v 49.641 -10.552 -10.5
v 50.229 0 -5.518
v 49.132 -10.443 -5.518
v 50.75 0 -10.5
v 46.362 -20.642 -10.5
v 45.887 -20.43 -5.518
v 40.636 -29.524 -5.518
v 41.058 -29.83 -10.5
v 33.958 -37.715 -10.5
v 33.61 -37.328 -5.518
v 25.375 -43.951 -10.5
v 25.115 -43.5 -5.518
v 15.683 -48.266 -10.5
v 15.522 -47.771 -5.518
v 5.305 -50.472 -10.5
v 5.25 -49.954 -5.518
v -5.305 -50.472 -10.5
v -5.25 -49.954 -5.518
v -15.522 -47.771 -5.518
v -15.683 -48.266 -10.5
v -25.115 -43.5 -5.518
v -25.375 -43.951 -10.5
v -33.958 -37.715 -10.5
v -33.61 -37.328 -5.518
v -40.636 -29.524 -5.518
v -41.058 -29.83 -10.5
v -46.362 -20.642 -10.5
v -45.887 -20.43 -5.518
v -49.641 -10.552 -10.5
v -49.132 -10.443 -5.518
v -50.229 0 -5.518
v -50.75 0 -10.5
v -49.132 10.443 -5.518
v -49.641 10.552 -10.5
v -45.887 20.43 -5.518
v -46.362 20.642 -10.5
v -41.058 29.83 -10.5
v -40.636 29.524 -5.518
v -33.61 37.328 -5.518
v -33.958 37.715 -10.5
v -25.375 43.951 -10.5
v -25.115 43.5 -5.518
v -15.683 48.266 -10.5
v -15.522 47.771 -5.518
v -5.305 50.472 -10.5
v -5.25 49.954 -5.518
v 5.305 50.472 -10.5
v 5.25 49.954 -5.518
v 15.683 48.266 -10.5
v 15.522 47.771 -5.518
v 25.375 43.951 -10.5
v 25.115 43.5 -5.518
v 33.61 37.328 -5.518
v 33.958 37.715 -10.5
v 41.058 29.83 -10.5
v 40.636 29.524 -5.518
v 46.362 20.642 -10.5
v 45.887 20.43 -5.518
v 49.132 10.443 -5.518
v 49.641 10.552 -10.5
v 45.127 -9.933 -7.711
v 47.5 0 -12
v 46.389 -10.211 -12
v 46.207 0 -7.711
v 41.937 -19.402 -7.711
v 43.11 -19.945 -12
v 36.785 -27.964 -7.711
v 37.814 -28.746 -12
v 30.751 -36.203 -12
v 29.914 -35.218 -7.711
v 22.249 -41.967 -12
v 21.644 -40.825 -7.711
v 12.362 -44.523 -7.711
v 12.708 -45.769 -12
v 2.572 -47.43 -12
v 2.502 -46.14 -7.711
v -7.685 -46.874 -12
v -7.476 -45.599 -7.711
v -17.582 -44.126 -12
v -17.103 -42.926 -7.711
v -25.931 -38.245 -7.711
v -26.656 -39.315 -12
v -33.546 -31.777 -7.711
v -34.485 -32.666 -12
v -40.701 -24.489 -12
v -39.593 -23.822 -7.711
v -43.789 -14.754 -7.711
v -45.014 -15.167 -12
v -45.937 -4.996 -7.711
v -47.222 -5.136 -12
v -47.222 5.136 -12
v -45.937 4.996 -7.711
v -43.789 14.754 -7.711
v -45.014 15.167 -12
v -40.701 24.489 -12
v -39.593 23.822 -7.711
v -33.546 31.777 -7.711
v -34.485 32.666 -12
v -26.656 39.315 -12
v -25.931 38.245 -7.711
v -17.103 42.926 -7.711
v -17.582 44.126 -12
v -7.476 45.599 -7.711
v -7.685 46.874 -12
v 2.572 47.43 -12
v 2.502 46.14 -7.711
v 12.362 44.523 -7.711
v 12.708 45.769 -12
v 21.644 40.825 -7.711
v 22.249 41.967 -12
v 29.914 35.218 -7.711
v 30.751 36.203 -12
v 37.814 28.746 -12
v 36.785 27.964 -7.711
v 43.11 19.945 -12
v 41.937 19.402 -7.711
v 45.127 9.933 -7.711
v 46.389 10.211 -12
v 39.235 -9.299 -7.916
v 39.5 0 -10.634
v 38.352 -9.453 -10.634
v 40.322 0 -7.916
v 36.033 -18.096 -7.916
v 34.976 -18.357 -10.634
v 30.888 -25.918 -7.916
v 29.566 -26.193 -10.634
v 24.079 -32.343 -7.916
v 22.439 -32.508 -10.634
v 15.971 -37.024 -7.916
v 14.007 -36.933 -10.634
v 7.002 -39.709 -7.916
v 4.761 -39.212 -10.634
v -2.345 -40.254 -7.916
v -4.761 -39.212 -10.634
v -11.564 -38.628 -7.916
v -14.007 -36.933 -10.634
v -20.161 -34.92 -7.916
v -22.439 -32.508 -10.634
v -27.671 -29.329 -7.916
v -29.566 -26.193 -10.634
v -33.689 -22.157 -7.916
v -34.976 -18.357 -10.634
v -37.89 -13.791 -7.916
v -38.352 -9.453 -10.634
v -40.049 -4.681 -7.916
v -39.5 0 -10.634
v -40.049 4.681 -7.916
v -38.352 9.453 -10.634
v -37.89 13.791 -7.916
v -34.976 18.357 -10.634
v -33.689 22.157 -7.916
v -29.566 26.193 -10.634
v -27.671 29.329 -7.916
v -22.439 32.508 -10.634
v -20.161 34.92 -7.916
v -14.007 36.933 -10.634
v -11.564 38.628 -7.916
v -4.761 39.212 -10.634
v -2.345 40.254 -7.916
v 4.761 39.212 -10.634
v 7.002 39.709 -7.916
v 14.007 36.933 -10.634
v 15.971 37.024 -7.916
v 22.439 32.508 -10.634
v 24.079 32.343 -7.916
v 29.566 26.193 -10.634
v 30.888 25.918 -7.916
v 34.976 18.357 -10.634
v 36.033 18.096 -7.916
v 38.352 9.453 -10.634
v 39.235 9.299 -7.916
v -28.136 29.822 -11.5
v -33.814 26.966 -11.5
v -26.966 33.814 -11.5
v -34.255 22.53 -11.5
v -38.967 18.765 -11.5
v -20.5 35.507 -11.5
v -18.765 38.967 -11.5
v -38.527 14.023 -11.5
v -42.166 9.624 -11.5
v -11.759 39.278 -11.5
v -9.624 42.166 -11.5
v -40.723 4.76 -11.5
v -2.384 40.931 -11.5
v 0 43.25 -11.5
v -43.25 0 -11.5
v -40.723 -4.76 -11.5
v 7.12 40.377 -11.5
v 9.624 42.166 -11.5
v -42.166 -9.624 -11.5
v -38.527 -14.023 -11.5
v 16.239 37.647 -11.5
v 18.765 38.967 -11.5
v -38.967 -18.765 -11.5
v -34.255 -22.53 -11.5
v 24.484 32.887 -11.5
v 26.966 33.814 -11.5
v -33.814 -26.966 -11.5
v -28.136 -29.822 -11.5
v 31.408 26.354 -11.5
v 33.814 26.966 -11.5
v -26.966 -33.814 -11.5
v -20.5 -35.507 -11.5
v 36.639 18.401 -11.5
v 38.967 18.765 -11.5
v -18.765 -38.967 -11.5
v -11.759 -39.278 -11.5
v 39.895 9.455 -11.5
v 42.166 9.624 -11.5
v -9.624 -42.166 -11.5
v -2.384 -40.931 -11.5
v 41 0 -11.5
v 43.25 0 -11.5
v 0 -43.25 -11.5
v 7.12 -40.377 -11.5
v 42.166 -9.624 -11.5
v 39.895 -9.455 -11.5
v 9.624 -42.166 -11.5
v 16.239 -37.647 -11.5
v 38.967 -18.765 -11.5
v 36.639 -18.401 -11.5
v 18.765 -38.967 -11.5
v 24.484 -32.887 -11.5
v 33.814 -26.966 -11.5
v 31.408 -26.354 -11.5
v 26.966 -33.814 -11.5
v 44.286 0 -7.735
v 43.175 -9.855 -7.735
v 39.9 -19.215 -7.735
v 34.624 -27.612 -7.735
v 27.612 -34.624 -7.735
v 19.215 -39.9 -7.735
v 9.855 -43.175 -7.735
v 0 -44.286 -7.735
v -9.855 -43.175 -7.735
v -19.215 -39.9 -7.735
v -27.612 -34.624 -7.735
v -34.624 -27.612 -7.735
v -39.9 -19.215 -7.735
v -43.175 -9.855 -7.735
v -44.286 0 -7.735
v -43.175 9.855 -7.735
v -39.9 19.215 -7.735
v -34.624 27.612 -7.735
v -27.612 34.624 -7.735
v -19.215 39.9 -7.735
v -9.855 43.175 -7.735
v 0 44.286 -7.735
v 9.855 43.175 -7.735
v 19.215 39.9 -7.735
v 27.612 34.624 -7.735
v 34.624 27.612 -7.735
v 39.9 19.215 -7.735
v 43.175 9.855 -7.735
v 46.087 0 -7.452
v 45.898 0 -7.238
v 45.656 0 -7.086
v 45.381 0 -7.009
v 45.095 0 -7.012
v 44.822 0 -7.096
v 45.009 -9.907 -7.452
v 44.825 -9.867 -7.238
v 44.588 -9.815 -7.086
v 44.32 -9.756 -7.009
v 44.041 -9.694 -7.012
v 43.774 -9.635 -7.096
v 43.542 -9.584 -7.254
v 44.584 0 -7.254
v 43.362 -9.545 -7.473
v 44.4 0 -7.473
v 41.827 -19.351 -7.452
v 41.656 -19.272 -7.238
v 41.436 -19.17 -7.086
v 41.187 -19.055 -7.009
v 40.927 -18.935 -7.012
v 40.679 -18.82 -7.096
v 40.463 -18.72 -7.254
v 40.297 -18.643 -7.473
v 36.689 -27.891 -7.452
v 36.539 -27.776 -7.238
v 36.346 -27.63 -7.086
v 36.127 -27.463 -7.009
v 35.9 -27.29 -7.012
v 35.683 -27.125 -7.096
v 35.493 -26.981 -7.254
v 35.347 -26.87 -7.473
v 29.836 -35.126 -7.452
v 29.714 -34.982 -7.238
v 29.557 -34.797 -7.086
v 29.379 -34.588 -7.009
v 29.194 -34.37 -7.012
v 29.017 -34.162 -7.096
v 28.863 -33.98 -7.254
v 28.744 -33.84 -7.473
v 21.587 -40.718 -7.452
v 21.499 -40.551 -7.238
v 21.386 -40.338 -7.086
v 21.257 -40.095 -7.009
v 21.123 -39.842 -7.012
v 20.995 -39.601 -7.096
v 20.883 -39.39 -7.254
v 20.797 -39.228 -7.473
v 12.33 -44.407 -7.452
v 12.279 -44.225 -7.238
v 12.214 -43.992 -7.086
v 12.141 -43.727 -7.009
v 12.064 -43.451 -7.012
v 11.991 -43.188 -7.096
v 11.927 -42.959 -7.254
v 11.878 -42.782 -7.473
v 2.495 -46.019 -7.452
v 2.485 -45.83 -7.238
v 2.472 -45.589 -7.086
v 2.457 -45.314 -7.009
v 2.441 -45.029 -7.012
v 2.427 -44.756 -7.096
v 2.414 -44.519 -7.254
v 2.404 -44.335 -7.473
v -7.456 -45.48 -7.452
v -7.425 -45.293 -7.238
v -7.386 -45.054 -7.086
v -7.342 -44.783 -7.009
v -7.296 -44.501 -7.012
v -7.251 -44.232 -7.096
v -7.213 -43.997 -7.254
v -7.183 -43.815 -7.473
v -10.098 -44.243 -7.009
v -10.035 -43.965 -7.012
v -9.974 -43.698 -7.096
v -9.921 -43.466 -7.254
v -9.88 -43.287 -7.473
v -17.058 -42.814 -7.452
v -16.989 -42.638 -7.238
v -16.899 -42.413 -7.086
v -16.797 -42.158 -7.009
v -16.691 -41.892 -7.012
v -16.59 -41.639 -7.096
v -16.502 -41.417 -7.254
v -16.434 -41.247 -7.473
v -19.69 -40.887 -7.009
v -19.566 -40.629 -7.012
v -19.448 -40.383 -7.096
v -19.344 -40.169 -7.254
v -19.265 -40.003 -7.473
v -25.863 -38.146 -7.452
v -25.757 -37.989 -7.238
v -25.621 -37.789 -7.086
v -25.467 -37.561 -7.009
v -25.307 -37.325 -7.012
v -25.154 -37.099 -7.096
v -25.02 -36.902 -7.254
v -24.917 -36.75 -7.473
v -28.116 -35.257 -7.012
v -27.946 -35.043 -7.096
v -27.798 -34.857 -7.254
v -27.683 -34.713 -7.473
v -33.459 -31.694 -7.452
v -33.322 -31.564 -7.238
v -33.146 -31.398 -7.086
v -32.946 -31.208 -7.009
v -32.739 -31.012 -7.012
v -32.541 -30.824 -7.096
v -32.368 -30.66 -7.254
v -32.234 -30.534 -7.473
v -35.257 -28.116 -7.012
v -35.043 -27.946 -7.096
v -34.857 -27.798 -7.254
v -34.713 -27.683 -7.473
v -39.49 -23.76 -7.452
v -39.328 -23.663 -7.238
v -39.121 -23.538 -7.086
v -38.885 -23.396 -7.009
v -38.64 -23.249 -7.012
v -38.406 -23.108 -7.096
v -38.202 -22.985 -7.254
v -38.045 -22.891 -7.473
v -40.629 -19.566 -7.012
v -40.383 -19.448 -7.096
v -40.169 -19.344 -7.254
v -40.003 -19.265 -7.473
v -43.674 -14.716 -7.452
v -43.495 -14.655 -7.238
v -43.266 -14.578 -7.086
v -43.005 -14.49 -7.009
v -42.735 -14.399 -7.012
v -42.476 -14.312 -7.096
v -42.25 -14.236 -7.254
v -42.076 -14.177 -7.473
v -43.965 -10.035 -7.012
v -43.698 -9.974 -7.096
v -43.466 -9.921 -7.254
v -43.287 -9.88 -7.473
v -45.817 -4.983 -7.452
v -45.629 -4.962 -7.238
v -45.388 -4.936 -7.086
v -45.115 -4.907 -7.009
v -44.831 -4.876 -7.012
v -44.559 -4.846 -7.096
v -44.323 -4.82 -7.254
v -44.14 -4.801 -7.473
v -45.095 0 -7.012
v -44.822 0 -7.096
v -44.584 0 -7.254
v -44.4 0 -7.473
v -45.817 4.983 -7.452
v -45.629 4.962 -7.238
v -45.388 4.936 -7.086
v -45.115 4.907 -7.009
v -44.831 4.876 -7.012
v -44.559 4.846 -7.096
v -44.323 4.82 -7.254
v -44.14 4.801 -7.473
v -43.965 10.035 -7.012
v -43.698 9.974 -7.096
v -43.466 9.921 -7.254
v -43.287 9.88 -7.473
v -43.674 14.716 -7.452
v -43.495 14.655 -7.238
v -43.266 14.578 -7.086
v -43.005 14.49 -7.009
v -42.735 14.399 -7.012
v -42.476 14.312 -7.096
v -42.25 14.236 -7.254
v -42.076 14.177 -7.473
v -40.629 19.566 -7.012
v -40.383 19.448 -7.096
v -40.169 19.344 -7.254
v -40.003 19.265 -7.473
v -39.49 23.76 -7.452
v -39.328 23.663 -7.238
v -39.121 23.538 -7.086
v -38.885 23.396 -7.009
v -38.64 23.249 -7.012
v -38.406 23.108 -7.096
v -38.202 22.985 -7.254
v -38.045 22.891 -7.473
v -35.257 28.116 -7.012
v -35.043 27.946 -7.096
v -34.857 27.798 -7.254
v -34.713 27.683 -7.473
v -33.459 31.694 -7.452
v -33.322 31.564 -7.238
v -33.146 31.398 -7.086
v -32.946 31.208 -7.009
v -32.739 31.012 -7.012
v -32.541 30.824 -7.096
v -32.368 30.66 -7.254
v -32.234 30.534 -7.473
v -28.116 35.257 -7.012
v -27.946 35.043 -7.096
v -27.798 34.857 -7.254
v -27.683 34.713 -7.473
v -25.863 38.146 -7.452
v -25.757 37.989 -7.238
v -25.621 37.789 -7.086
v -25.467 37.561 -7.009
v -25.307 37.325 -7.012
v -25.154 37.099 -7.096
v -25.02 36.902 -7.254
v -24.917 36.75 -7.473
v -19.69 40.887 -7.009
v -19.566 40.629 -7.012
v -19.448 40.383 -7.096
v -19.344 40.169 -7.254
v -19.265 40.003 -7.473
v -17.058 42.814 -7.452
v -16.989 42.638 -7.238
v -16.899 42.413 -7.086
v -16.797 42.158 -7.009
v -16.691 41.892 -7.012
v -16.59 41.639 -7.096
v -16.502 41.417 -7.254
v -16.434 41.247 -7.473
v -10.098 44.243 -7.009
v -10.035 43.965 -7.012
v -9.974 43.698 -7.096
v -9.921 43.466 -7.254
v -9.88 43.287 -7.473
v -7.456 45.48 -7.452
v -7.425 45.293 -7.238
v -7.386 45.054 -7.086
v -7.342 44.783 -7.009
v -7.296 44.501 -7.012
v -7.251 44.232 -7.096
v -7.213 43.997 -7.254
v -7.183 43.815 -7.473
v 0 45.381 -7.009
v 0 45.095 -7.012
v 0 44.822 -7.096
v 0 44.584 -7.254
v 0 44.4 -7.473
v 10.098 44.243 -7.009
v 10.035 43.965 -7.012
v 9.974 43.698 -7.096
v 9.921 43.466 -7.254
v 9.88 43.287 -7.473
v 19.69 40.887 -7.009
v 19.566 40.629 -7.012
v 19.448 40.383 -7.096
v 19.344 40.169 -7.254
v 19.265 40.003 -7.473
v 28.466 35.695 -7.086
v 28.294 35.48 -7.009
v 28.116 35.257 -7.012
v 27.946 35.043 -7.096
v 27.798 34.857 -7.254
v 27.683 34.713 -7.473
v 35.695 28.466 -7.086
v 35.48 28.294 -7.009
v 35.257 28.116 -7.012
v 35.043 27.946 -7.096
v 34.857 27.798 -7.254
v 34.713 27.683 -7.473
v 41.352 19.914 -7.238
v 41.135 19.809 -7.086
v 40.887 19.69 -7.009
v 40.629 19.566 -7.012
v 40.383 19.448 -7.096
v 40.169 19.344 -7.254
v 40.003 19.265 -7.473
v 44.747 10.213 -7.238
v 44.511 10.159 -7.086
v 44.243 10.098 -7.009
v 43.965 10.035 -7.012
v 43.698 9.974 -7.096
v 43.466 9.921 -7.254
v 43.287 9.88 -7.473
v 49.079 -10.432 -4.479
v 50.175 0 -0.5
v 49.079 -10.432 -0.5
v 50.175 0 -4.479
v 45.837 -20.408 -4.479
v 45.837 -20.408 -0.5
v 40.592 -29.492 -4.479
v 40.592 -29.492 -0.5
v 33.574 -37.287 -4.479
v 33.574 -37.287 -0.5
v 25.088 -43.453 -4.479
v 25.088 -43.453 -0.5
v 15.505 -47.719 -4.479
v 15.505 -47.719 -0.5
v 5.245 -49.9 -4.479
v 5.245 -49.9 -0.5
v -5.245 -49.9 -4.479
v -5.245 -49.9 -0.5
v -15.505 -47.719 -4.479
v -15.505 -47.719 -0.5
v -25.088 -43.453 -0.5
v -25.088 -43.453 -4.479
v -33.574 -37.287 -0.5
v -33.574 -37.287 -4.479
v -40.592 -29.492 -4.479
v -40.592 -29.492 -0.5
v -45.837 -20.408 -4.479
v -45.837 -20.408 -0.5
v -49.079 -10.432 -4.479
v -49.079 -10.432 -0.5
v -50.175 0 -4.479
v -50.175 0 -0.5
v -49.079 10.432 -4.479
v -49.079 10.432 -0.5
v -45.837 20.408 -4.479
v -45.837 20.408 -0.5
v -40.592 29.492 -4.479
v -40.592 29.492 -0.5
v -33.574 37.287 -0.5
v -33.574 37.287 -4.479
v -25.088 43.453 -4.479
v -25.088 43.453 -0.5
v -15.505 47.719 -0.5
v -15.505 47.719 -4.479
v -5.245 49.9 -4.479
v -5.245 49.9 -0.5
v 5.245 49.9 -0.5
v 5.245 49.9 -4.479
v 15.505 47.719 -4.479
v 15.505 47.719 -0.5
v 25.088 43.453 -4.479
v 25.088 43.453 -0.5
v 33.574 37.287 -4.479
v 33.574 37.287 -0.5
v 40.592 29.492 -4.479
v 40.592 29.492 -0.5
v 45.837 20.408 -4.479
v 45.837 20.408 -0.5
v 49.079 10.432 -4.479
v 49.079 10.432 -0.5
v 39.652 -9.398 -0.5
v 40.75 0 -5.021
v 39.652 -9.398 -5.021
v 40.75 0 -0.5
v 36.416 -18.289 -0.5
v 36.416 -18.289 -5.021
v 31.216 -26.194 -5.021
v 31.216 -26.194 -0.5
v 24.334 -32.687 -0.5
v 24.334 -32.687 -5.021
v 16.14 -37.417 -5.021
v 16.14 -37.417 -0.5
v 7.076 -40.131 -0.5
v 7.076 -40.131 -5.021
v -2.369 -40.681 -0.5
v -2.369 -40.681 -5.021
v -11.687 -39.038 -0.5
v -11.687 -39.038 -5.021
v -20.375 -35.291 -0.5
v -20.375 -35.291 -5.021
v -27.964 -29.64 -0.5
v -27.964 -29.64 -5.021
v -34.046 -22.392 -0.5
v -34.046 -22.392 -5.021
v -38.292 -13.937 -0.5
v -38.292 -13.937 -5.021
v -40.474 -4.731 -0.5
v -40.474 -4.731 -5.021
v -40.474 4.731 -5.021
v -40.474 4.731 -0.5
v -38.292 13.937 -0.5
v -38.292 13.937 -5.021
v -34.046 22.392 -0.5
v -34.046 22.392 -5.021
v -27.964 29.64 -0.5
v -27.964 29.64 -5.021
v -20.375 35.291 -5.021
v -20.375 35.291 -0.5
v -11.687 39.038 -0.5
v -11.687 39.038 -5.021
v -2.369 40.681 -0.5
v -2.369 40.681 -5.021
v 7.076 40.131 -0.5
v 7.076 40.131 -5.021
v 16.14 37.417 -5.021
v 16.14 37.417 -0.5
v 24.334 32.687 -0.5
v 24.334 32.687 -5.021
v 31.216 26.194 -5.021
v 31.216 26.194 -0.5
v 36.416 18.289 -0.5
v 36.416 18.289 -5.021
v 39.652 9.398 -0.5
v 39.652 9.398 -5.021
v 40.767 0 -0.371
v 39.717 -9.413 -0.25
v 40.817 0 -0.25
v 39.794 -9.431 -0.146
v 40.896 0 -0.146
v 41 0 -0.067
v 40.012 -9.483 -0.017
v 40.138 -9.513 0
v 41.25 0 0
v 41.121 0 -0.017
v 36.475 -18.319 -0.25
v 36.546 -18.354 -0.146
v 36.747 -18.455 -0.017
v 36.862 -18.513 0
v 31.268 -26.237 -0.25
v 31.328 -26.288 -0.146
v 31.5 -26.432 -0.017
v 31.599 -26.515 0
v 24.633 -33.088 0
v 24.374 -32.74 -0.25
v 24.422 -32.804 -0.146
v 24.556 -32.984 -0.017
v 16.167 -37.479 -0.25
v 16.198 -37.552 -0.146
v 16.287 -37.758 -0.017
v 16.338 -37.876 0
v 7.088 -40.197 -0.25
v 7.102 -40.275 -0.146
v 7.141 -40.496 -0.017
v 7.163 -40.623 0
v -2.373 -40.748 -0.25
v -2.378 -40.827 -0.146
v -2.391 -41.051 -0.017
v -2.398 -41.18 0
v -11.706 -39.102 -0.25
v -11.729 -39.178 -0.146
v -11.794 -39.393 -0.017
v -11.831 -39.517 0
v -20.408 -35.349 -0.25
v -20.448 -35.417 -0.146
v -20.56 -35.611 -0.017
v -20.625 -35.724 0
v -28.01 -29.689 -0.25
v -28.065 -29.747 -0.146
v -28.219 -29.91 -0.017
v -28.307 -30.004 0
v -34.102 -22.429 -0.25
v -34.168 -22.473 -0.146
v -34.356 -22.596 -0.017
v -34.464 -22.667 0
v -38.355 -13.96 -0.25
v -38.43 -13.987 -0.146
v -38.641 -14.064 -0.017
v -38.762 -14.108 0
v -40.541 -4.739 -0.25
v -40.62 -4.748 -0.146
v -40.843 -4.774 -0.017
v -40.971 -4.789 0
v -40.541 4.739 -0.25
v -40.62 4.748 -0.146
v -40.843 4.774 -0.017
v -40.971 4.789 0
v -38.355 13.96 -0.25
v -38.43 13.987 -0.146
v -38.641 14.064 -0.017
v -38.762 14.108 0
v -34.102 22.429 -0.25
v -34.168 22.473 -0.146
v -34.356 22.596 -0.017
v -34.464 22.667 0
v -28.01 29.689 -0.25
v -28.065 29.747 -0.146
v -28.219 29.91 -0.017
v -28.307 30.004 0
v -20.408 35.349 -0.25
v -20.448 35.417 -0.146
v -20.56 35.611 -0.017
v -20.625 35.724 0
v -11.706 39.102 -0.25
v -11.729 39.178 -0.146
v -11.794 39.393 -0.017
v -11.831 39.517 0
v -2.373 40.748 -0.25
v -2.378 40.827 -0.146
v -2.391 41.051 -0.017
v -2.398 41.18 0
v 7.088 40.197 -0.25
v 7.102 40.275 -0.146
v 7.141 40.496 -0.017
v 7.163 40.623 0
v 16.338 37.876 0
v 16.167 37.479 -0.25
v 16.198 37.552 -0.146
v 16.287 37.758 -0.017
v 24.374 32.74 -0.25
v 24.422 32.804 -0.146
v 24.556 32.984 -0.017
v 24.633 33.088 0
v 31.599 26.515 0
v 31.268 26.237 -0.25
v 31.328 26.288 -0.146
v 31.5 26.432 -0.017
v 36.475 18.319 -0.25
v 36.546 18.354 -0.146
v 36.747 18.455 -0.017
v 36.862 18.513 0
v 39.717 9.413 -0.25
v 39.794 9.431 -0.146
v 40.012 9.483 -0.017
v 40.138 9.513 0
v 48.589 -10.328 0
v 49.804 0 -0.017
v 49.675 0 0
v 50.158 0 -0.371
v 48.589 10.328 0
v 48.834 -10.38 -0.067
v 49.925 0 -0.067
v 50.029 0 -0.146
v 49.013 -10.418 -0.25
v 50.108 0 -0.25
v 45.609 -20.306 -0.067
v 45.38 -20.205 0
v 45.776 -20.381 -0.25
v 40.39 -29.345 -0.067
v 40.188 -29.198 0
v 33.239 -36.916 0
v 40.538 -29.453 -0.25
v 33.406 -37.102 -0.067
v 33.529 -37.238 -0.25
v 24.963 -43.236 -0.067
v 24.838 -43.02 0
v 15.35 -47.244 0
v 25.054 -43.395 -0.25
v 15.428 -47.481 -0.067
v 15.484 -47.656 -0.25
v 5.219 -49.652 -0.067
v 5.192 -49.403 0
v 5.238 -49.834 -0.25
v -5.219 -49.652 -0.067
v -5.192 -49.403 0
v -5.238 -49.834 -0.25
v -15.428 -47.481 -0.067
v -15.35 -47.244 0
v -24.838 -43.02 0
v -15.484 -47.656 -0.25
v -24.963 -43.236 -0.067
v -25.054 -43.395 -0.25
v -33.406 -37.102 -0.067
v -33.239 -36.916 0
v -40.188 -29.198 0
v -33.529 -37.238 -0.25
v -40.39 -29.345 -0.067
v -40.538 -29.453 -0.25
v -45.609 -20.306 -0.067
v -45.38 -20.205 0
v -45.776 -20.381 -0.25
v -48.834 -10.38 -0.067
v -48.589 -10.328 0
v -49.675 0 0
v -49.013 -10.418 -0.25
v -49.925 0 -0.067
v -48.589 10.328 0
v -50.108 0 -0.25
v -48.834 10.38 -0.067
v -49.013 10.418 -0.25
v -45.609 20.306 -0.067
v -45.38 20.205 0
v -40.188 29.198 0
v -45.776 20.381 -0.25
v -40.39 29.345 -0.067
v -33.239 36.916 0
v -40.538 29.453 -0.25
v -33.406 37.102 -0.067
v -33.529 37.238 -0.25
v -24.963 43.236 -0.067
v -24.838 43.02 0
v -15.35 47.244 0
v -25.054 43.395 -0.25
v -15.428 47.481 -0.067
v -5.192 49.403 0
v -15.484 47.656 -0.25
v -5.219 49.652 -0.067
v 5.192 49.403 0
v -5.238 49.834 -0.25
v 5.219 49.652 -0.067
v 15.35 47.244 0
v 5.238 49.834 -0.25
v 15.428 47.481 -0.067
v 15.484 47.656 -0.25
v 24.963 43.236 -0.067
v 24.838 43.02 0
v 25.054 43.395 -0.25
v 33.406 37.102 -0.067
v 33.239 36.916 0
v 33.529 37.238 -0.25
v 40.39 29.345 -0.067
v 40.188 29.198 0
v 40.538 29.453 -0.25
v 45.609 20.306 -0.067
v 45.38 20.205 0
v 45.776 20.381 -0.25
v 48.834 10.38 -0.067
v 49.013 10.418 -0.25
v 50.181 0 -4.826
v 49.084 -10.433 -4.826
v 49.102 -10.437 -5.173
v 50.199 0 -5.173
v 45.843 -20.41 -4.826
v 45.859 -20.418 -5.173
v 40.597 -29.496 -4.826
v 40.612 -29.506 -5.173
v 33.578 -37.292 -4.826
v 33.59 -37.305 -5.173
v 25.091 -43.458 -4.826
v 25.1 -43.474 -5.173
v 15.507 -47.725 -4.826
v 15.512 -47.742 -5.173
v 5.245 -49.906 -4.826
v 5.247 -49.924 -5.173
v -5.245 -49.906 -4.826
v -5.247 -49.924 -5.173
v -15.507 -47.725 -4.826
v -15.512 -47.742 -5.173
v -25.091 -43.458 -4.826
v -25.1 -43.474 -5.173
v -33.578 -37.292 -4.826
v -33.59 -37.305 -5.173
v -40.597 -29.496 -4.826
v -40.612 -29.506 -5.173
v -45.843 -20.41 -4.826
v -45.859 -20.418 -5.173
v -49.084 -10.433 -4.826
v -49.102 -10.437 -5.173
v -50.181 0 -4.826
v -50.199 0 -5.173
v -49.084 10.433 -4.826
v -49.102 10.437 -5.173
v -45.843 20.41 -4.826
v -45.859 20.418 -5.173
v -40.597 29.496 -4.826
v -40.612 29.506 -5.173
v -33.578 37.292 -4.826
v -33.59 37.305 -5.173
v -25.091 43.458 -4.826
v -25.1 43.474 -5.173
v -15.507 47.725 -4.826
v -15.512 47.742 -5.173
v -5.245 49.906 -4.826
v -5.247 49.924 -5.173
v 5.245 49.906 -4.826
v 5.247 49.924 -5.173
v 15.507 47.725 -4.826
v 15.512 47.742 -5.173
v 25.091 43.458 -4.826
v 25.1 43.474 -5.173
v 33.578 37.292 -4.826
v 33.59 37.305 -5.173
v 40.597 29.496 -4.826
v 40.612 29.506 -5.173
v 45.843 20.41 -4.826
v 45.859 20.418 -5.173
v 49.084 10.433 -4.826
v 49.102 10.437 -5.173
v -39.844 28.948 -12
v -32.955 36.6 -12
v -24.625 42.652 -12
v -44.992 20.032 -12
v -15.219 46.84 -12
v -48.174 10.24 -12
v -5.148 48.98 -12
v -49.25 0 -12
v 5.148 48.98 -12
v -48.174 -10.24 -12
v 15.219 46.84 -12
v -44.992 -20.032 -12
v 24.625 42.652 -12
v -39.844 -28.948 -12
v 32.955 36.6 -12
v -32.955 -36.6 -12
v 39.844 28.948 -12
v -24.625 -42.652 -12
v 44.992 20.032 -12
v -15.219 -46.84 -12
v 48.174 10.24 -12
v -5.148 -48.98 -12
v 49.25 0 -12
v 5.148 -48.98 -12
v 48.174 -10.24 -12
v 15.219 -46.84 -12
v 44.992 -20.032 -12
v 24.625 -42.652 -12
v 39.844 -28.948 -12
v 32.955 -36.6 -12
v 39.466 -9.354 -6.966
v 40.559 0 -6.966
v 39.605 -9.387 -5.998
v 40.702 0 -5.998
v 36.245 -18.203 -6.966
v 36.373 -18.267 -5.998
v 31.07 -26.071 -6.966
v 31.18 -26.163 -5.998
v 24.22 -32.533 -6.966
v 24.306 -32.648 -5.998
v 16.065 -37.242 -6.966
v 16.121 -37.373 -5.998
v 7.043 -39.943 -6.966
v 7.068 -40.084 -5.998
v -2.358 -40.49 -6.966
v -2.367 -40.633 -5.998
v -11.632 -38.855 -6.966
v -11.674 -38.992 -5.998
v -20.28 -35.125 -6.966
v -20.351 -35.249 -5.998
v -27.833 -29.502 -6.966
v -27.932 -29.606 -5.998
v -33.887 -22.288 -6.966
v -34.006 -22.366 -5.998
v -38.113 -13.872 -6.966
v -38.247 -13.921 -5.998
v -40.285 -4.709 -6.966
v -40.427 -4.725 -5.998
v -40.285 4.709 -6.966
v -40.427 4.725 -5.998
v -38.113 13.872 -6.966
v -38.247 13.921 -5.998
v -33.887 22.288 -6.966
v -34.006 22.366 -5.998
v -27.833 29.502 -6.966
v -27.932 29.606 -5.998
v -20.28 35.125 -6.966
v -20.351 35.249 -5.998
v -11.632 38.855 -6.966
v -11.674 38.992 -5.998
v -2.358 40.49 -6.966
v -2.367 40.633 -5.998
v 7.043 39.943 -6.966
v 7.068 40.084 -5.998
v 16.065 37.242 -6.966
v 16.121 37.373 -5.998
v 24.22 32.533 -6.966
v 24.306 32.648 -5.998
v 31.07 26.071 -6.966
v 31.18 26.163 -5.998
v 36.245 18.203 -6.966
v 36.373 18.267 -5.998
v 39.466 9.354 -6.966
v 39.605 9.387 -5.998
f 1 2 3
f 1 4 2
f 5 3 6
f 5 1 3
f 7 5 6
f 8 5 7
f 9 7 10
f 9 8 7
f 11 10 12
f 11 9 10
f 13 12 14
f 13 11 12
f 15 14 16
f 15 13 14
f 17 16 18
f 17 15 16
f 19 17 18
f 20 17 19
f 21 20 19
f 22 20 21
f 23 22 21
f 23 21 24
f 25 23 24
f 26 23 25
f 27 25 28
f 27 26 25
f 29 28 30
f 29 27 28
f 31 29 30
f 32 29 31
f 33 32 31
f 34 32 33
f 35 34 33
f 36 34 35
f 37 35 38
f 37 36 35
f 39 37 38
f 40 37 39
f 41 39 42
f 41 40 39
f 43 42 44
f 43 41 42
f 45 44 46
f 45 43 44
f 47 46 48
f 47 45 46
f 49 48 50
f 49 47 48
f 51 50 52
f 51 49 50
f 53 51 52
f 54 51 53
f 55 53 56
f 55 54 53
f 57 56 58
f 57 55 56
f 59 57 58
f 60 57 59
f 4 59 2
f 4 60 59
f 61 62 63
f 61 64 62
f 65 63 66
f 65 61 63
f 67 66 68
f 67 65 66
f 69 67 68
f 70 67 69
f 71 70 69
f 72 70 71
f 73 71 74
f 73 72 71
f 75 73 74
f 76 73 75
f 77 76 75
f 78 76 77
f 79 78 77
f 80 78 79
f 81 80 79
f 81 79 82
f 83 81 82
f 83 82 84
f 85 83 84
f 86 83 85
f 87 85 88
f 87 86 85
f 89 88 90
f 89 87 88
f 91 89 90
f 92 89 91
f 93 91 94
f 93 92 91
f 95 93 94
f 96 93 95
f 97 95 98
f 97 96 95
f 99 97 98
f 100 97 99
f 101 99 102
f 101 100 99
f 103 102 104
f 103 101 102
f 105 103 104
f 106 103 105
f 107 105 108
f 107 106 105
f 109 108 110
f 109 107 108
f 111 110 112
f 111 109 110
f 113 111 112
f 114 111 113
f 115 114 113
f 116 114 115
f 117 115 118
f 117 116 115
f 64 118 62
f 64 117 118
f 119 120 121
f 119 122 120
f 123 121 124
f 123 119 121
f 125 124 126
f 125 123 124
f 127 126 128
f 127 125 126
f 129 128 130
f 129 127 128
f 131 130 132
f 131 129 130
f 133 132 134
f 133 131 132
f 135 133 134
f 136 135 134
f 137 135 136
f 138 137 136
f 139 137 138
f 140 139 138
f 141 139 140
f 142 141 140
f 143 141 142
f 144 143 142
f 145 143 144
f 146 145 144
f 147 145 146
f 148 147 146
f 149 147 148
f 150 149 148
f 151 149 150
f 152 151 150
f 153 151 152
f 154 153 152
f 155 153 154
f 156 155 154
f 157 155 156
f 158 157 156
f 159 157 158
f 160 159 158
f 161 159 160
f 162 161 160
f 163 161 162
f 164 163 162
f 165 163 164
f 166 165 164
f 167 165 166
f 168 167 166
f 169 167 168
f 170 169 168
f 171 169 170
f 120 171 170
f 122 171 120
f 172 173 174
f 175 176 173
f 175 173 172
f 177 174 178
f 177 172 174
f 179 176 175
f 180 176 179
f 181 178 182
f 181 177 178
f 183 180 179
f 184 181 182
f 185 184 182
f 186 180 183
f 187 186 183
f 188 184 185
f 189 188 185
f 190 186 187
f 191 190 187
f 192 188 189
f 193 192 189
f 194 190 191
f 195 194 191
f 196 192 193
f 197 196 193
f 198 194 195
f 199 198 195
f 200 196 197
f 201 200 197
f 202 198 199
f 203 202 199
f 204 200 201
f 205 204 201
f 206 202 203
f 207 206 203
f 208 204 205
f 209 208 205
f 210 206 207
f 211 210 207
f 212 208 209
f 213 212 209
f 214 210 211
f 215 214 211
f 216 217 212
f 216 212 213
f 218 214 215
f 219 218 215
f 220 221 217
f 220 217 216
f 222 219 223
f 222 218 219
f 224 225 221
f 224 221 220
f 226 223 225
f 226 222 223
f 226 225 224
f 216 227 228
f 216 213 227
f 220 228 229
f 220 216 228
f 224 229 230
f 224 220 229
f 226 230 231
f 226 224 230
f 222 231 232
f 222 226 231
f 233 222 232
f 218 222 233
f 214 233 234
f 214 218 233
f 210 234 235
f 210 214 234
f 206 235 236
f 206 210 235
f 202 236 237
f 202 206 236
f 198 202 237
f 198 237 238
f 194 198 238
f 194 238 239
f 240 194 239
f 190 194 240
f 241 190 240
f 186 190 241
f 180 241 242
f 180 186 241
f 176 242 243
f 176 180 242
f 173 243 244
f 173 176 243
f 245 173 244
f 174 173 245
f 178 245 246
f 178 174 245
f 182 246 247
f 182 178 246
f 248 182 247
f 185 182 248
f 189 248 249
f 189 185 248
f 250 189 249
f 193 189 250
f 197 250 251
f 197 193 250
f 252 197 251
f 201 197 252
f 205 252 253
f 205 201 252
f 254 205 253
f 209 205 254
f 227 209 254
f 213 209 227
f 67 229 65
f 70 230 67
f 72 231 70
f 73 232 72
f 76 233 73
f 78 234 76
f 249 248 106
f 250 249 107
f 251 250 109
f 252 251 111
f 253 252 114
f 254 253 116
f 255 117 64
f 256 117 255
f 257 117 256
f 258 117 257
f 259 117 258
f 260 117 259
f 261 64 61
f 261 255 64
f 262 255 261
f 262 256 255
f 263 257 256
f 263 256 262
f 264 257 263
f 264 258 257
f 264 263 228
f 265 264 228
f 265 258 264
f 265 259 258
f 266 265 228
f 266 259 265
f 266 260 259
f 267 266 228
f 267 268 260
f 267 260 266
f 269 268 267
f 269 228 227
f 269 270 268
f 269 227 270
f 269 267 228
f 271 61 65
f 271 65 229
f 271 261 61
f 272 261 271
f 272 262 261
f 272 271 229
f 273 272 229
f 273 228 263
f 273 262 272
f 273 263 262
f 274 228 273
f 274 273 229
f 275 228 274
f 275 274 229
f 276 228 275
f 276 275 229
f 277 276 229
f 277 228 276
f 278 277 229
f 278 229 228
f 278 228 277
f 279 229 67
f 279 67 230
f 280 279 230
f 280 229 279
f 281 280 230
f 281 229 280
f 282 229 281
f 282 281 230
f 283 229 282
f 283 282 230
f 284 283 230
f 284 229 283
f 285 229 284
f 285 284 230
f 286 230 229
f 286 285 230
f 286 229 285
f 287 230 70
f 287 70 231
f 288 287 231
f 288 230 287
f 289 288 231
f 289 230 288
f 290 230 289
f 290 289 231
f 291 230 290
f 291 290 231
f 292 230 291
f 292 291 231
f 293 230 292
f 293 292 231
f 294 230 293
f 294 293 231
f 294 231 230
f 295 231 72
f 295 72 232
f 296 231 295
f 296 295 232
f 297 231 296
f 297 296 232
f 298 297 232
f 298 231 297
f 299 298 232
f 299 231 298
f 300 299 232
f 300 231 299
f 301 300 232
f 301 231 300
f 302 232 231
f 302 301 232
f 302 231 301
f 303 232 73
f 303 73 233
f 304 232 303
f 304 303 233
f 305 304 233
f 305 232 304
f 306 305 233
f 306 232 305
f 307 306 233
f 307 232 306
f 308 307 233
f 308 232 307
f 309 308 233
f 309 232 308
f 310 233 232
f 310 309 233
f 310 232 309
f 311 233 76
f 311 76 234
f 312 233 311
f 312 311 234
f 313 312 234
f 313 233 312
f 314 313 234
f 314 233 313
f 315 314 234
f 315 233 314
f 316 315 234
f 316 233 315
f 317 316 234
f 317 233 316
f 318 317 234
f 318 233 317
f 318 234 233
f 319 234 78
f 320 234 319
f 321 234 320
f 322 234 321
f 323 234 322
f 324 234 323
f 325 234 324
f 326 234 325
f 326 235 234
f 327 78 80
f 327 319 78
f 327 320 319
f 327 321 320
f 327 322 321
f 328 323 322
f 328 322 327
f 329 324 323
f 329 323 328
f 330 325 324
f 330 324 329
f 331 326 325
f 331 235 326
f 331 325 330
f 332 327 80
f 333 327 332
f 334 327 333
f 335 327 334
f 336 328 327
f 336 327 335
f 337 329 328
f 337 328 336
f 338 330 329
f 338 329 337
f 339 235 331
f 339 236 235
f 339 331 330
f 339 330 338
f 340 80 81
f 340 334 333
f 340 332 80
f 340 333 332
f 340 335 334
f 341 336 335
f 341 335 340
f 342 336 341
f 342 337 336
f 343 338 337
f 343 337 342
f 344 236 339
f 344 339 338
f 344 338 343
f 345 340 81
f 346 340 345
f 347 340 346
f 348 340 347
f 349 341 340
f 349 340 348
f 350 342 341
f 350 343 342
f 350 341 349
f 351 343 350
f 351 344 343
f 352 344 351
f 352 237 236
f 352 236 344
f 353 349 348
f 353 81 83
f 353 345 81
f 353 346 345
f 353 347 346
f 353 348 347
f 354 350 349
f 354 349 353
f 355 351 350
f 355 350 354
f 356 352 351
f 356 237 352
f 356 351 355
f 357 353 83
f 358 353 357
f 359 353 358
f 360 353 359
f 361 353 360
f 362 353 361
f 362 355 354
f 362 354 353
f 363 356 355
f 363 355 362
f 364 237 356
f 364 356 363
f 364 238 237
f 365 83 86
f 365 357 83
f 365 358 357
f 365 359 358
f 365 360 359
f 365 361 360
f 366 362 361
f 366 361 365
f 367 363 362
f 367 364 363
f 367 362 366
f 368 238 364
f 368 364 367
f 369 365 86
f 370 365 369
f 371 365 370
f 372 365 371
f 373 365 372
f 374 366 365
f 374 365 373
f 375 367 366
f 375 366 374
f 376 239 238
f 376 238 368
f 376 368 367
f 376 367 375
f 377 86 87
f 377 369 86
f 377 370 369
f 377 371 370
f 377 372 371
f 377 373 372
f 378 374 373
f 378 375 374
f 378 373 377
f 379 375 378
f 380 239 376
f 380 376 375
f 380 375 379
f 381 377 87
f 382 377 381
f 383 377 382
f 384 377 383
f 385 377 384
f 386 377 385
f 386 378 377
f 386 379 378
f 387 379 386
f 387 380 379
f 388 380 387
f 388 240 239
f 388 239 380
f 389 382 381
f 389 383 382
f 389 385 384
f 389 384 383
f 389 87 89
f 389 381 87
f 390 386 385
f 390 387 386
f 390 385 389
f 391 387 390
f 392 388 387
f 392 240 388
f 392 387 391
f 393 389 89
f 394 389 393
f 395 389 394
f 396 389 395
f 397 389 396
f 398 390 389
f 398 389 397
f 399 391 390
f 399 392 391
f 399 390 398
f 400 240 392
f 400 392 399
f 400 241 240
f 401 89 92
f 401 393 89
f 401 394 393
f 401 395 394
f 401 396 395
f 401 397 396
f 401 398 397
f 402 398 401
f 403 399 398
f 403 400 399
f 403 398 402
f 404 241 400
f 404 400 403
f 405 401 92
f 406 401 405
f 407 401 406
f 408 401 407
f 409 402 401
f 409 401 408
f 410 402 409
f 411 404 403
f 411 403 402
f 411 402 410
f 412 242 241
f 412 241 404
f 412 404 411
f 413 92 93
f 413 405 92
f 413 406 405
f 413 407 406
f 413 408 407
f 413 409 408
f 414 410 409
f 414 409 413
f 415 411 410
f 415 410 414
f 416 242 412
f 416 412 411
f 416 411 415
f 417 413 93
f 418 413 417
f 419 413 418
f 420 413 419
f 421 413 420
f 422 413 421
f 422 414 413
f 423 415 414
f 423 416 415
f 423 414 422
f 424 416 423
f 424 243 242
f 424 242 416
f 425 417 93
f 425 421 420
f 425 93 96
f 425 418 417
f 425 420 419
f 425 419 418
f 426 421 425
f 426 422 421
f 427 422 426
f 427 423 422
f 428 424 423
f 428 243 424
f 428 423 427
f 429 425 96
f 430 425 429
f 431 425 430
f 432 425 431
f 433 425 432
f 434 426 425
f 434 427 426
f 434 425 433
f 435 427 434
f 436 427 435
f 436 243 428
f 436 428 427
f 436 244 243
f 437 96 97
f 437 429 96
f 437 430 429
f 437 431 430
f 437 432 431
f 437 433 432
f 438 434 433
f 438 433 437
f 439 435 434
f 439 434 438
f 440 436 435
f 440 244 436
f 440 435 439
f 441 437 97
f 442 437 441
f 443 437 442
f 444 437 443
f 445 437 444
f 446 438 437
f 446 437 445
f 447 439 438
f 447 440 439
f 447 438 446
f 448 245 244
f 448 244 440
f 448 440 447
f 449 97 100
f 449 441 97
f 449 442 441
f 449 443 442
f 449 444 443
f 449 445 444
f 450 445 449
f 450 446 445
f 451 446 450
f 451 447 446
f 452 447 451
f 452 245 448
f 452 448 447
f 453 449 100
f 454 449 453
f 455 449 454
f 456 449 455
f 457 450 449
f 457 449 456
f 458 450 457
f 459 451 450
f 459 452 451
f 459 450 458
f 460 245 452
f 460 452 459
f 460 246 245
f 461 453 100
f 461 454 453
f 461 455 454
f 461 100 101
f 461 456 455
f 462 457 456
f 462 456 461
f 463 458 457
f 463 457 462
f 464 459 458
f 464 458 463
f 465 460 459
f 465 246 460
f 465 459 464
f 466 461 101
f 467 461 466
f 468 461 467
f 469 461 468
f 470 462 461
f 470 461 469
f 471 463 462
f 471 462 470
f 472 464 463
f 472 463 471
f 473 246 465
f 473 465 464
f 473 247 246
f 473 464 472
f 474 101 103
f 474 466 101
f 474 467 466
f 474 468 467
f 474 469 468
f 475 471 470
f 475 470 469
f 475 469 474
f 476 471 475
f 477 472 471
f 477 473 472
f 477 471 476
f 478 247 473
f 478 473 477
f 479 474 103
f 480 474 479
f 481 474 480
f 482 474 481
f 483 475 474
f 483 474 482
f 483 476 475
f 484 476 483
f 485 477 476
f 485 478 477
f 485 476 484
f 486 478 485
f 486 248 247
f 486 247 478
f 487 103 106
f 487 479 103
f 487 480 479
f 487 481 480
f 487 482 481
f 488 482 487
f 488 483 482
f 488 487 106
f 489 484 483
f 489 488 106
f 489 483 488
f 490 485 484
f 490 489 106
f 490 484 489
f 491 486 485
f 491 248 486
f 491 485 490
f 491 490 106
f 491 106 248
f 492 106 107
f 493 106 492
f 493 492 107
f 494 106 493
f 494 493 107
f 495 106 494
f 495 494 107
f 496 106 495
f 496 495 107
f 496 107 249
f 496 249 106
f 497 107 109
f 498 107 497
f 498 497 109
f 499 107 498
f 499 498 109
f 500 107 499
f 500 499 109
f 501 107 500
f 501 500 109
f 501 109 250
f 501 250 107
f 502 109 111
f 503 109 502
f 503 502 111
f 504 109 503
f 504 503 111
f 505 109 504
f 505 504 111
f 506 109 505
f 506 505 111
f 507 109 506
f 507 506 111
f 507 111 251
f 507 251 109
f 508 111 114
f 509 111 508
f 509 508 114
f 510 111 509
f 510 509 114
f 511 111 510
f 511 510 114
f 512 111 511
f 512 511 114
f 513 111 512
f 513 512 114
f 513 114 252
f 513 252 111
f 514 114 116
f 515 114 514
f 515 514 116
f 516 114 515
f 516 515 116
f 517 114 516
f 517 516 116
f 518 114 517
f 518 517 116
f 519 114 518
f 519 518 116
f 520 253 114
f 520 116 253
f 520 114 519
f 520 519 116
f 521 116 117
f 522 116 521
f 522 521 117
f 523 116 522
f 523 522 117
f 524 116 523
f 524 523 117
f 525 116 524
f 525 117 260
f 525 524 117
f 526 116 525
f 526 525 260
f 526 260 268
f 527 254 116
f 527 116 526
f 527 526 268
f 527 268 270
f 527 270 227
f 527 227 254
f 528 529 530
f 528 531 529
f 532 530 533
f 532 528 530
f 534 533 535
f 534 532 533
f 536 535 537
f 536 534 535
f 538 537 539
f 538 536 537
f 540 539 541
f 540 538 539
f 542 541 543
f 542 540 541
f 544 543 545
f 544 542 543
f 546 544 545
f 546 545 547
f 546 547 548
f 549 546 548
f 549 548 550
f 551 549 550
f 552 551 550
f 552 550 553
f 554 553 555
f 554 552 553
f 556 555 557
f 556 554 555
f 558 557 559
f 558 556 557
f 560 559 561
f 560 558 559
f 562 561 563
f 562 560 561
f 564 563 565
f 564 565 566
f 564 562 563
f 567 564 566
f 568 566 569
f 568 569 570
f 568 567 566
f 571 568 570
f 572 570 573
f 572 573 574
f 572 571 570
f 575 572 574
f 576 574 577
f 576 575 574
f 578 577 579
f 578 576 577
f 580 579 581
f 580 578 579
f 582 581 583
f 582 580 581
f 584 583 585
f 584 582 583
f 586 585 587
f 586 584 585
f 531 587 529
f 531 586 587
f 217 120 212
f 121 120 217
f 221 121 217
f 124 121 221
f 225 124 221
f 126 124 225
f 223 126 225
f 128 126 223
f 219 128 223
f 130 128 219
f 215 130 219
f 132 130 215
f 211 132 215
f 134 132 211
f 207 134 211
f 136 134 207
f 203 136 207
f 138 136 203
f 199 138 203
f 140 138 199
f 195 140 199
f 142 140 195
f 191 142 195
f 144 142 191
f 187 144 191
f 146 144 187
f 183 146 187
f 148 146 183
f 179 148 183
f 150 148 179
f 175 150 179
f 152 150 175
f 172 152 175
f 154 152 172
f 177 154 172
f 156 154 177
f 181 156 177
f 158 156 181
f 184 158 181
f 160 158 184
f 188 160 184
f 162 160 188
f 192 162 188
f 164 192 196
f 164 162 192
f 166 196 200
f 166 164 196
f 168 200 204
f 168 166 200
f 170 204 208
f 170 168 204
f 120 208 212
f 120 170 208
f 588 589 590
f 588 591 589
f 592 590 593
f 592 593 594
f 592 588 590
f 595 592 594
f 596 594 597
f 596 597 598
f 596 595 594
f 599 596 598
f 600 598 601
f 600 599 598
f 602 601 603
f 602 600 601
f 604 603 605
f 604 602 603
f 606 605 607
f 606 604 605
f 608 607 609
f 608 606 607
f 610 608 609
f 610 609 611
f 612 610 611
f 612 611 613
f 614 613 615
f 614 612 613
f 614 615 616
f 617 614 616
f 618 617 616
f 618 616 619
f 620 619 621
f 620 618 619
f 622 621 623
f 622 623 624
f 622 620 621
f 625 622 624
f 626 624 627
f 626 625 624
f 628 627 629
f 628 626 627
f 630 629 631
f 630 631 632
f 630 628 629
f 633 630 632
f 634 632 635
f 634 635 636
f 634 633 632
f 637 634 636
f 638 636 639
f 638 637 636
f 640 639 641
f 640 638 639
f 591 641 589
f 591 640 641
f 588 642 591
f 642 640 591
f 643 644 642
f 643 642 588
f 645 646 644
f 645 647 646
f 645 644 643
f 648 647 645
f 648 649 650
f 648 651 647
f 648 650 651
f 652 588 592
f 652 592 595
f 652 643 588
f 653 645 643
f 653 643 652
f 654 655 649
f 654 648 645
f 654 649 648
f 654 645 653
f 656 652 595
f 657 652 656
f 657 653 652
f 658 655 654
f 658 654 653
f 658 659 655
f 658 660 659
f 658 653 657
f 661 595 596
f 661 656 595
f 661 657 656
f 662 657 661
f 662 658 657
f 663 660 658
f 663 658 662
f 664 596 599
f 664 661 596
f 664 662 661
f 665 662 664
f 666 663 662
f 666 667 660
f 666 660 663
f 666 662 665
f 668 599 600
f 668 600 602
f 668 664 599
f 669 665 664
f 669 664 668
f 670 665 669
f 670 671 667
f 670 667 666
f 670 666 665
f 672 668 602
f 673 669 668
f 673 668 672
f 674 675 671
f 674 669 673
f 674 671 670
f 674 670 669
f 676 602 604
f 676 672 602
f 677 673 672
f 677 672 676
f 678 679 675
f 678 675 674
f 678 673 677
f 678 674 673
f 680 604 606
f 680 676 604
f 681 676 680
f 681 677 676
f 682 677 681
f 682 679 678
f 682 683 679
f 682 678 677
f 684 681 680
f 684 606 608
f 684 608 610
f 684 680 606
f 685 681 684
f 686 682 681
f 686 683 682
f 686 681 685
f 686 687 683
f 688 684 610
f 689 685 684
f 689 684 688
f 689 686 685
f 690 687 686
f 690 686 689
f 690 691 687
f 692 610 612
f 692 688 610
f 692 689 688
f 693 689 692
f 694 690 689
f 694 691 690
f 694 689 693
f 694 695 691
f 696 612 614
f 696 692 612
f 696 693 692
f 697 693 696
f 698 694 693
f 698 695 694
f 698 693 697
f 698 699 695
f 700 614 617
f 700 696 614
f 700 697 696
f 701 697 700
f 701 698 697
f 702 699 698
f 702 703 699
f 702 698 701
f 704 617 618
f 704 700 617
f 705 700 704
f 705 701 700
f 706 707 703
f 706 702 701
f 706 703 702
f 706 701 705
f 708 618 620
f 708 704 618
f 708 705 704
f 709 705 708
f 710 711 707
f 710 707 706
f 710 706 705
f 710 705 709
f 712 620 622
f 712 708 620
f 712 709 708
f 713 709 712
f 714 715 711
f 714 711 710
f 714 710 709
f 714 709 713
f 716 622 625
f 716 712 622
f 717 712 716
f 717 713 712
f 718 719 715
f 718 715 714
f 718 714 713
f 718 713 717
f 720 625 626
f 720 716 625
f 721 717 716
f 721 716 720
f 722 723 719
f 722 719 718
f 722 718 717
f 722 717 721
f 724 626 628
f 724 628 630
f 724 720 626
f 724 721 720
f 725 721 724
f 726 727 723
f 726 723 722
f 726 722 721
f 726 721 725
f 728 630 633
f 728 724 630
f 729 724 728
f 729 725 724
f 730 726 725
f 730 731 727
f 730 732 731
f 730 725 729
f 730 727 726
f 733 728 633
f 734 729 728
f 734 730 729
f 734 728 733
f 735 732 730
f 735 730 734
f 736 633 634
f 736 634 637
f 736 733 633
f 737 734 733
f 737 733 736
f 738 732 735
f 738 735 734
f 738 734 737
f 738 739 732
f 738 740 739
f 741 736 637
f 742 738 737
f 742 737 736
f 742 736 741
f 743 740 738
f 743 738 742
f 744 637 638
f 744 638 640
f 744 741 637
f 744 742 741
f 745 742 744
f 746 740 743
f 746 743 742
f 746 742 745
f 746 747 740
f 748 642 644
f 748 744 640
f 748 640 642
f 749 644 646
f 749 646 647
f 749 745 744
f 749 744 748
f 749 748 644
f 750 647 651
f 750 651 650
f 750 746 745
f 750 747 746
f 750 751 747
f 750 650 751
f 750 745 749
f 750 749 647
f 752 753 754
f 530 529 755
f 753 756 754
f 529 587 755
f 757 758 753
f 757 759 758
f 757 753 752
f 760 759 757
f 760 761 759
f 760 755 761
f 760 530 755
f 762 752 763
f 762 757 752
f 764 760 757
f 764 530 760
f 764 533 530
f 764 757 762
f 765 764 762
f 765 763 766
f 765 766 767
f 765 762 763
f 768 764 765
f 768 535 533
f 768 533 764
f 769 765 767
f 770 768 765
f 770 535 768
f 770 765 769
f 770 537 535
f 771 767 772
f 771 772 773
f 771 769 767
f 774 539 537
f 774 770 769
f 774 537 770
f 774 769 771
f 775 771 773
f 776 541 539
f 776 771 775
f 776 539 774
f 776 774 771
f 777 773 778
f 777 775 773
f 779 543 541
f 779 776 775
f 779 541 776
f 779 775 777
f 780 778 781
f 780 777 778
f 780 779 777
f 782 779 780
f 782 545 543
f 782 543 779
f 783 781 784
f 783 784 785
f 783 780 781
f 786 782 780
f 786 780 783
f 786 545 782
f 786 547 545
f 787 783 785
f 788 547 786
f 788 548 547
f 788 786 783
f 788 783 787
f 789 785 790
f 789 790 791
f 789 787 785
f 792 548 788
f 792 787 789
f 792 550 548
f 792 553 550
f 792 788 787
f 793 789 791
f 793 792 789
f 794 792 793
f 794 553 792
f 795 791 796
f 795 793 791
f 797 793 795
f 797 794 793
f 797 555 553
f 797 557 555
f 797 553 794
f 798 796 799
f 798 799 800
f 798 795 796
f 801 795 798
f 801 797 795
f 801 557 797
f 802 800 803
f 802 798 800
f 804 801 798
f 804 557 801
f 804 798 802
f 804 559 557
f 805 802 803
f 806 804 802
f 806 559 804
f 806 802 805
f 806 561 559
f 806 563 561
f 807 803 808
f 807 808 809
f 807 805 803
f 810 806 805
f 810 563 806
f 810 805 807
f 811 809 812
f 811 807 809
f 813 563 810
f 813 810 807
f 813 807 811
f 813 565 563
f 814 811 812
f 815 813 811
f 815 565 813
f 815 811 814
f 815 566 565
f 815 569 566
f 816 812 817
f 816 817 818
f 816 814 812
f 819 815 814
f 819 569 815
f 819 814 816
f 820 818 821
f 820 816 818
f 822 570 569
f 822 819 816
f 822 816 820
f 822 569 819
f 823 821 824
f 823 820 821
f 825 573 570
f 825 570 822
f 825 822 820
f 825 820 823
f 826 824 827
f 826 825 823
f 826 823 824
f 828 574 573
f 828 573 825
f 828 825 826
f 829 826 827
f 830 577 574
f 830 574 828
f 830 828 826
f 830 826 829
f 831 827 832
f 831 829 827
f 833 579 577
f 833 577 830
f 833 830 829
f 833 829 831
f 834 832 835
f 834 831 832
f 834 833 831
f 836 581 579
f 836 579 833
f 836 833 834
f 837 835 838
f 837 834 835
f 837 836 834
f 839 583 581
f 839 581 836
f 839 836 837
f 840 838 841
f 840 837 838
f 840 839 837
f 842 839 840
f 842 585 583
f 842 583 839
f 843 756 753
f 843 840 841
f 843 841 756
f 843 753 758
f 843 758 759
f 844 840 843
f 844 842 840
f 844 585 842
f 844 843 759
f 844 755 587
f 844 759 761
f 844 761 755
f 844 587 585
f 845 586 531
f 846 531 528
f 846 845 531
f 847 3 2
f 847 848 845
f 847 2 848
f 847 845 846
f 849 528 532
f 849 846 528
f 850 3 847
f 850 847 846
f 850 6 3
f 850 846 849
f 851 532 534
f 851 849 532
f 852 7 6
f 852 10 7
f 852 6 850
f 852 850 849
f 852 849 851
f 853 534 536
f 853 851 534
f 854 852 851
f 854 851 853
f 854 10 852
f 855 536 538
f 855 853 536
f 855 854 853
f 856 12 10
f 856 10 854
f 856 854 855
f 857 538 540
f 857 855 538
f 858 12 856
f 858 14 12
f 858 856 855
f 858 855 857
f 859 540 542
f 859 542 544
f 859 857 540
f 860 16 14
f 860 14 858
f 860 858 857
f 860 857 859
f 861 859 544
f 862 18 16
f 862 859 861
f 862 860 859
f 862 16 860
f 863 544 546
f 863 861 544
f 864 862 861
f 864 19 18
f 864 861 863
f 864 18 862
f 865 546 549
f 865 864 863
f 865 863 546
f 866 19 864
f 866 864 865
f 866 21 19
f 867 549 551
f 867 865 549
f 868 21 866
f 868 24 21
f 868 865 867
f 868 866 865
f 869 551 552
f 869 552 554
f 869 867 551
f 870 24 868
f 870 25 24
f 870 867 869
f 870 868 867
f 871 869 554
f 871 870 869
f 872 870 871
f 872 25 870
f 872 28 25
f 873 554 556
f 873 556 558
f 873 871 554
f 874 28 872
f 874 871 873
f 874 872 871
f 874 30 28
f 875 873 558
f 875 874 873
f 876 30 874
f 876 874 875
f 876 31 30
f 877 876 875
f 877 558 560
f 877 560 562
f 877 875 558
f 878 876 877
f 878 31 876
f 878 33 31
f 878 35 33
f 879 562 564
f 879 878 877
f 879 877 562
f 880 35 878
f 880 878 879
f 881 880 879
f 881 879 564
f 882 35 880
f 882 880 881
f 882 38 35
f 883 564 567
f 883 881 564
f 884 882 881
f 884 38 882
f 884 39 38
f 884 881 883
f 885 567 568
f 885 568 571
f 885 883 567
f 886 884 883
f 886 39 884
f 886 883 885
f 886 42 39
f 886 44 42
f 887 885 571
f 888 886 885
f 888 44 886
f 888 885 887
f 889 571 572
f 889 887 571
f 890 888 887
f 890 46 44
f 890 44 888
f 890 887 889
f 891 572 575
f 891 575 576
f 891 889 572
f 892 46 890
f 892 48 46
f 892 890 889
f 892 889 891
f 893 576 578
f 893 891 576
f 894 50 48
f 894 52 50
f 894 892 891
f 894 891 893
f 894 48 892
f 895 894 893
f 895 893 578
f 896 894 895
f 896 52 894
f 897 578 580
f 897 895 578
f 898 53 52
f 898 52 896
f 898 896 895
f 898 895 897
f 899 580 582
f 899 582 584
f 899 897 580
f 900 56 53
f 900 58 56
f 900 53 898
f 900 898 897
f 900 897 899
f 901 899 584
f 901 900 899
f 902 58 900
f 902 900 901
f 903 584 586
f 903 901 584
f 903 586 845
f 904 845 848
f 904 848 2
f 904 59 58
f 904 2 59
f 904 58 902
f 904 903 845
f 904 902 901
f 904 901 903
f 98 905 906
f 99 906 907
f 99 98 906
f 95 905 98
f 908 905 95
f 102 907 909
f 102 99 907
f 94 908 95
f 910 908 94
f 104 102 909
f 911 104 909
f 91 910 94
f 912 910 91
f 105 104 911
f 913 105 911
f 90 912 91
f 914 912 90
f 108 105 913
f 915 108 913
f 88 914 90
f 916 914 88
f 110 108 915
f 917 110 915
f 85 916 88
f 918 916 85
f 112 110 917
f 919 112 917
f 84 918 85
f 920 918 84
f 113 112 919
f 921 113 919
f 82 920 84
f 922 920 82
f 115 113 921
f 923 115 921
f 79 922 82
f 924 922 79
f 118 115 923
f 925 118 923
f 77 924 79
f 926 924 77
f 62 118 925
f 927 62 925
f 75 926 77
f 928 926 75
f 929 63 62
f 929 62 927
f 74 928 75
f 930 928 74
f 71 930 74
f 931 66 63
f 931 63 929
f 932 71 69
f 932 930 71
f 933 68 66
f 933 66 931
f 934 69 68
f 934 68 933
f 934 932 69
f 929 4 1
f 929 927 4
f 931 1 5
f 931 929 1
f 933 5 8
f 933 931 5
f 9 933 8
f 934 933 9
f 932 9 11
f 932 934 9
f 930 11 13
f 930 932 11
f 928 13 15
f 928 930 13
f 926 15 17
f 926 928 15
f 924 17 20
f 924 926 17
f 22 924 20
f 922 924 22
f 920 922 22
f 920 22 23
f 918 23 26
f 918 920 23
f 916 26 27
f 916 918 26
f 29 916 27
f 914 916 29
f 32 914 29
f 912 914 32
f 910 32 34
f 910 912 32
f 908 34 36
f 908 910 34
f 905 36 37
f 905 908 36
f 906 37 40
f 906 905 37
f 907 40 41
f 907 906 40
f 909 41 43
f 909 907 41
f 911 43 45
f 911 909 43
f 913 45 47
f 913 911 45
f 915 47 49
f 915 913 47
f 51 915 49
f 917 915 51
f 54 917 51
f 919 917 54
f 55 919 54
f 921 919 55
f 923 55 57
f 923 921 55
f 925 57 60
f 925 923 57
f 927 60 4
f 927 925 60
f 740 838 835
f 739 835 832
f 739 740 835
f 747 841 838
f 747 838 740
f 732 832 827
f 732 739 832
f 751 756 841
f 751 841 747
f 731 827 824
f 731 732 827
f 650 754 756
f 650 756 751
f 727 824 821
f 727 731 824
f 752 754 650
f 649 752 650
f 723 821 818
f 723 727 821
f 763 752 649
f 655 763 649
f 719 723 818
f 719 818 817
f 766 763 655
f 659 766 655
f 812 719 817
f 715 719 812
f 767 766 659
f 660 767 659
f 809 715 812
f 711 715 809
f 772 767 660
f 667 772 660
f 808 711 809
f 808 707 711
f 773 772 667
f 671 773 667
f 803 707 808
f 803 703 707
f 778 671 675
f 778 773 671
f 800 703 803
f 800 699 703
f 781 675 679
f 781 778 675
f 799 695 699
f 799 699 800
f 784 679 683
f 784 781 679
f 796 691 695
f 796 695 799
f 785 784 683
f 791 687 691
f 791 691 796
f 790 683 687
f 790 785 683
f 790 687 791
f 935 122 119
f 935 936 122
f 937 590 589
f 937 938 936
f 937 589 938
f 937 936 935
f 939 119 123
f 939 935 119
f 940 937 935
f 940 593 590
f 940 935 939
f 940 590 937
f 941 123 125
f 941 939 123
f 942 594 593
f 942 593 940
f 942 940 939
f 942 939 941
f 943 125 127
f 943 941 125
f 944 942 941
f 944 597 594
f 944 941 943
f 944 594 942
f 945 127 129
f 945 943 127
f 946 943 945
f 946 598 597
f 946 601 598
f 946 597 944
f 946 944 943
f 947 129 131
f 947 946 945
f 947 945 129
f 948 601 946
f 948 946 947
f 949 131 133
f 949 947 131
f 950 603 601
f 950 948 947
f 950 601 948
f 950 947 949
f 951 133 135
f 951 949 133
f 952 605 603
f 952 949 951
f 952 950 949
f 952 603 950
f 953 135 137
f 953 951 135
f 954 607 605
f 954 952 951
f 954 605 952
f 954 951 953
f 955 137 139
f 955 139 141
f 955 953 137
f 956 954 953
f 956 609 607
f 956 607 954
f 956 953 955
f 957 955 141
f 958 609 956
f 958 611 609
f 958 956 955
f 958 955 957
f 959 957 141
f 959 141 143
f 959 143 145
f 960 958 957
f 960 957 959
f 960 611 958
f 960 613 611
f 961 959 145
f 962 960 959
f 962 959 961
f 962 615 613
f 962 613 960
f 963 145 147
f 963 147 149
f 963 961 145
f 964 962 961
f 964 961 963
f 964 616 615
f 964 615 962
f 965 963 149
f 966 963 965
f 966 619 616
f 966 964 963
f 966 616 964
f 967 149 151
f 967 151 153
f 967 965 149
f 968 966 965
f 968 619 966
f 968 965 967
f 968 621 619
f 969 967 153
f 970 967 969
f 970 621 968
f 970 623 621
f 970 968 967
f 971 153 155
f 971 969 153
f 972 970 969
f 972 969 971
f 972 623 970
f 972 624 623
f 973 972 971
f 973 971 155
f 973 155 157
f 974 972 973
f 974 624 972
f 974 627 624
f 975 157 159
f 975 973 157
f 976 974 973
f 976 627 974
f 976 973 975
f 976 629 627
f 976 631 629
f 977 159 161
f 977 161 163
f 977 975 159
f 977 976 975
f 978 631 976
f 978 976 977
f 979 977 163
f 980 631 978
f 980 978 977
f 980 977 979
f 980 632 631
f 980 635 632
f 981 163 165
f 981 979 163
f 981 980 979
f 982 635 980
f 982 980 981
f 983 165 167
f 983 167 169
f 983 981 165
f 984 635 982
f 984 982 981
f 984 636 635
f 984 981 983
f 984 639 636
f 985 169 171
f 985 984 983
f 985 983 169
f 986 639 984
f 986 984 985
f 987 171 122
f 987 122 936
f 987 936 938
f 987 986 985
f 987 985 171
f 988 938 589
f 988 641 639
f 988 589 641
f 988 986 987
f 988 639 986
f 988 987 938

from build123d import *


with BuildPart() as part:
    # Sketch1 → Revolve1 (revolve)
    with BuildSketch(Plane(origin=(0, 0, 0), x_dir=(0, 0, -1), z_dir=(1, 0, 0))):
        with BuildLine():
            Line((0, 41.25), (0, 49.675))
            ThreePointArc((0, 49.675), (0.146446609, 50.028553391), (0.5, 50.175))
            Line((0.5, 50.175), (4.478693294, 50.175))
            ThreePointArc((4.478693294, 50.175), (4.999293087, 50.188560401), (5.518480971, 50.229204829))
            Line((5.518480971, 50.229204829), (10.5, 50.75))
            Line((10.5, 50.75), (12, 49.25))
            Line((12, 49.25), (12, 47.5))
            Line((12, 47.5), (7.711429508, 46.207458652))
            ThreePointArc((7.711429508, 46.207458652), (7.000073654, 45.237863155), (7.734753866, 44.285819266))
            Line((7.734753866, 44.285819266), (11.5, 43.25))
            Line((11.5, 43.25), (11.5, 41))
            Line((11.5, 41), (10.633974596, 39.5))
            Line((10.633974596, 39.5), (7.915505944, 40.321990009))
            ThreePointArc((7.915505944, 40.321990009), (6.484090894, 40.642418817), (5.021199936, 40.75))
            Line((5.021199936, 40.75), (0.5, 40.75))
            ThreePointArc((0.5, 40.75), (0.146446609, 40.896446609), (0, 41.25))
        make_face()
    revolve(axis=Axis((0, 0, 0), (0, 0, -1)))


solid = part.part
